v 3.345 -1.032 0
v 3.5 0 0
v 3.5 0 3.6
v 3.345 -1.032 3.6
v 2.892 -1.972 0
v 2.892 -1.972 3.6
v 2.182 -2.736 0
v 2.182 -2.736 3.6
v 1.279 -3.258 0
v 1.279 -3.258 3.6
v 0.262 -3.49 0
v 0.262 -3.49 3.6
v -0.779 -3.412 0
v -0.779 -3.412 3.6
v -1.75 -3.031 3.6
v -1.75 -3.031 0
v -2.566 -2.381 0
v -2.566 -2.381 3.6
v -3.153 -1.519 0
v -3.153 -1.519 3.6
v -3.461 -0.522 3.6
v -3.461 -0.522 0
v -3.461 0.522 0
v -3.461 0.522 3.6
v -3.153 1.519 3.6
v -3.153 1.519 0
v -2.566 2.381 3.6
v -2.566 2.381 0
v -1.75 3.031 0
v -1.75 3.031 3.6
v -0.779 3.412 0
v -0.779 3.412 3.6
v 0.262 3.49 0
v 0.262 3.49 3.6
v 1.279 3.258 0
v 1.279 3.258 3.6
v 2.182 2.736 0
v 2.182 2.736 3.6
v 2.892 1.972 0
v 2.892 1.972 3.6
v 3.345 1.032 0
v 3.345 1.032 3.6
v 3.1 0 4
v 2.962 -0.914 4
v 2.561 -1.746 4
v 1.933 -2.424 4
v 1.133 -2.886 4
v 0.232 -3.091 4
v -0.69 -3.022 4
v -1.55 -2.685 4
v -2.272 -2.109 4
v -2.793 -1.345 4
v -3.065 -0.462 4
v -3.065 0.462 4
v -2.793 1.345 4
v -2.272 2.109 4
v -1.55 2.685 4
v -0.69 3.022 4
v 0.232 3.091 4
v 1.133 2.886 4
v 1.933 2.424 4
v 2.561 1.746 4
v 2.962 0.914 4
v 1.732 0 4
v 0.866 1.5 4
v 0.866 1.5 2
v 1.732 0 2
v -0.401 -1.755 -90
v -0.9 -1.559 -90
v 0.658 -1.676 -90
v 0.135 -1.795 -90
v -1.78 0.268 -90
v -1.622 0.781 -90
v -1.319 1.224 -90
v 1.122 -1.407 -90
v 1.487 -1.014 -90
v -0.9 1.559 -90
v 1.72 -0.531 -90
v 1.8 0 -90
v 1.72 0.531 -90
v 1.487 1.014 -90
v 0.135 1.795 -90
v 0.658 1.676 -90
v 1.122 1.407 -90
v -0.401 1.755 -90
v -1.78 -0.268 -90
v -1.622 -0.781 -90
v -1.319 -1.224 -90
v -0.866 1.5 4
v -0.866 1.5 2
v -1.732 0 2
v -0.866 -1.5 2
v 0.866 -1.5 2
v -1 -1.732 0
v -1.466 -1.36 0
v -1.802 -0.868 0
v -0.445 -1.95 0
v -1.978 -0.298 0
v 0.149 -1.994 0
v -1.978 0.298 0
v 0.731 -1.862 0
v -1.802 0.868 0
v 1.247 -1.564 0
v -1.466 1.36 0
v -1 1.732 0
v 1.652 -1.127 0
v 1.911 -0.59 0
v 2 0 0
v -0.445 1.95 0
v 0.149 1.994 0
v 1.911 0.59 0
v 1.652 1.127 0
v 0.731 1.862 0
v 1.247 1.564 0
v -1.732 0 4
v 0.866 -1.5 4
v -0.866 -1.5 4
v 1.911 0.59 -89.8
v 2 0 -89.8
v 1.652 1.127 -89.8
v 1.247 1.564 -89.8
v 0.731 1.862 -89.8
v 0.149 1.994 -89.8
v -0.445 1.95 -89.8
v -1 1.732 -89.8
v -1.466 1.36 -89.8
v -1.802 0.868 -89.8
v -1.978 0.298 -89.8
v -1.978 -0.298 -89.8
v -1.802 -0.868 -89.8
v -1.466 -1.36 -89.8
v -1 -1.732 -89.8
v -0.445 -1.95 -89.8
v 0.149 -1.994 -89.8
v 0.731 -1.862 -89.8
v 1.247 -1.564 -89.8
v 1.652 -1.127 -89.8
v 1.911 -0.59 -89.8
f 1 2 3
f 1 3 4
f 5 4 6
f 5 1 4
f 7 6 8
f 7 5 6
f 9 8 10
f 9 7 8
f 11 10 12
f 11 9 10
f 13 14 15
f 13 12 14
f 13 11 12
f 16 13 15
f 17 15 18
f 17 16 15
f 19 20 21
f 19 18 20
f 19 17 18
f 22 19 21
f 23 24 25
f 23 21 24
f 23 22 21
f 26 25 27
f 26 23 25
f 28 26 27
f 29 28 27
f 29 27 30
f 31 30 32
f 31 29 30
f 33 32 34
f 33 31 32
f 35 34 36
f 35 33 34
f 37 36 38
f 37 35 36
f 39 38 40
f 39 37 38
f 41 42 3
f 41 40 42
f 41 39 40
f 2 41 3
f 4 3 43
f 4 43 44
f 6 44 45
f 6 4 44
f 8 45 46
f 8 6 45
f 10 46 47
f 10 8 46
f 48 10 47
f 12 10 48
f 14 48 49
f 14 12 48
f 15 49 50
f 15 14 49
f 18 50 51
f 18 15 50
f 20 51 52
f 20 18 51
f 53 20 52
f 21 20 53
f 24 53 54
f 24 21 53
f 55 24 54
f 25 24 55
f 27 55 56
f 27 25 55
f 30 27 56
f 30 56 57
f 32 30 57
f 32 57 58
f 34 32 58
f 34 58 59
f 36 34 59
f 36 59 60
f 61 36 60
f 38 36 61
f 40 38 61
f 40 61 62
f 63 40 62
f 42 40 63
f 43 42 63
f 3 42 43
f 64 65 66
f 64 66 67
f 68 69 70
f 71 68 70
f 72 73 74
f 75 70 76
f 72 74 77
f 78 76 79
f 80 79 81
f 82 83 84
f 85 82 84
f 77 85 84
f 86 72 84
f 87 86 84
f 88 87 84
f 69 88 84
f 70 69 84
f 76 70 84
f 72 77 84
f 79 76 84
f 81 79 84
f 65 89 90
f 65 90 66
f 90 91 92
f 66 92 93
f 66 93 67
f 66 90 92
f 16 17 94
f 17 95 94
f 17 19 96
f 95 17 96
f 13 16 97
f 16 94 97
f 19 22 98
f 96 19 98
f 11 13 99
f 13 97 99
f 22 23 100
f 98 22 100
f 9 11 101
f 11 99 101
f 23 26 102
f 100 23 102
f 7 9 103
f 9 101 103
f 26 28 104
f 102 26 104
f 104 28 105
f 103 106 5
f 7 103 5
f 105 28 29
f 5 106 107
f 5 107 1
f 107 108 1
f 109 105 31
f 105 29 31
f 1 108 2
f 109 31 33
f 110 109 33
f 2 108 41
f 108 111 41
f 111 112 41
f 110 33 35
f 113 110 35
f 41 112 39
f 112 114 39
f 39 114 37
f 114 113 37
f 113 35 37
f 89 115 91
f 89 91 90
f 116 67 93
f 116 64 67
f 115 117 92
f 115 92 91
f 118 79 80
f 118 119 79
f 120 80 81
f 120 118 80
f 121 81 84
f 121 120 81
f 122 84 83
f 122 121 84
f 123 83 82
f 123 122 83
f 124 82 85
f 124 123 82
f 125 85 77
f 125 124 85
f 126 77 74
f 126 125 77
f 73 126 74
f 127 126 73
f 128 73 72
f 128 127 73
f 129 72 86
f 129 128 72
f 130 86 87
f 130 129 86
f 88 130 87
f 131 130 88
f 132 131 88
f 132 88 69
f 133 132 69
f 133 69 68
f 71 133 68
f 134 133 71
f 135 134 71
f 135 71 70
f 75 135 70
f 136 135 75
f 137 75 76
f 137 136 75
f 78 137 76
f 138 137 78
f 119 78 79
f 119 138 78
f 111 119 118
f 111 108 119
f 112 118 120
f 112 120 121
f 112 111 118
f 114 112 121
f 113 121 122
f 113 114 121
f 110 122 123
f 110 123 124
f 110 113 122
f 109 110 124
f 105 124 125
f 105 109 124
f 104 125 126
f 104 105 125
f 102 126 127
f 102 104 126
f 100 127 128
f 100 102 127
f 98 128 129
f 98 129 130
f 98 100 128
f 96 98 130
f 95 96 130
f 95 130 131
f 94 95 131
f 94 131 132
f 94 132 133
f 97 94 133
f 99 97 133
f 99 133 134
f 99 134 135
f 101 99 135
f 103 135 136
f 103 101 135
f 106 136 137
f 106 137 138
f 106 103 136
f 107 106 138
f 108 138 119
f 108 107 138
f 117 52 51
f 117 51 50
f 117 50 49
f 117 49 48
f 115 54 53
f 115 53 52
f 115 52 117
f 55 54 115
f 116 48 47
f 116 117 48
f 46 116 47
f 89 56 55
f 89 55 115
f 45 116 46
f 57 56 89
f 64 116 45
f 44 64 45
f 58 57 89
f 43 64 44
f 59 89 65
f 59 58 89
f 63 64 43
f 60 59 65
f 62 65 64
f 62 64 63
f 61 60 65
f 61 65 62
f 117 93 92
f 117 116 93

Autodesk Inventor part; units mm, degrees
ref_plane "YZ Plane" through (0, 0, 0) normal (1, 0, 0) x (0, 1, 0)
ref_plane "XZ Plane" through (0, 0, 0) normal (0, 1, 0) x (-1, 0, 0)
ref_plane "XY Plane" through (0, 0, 0) normal (0, 0, 1) x (1, 0, 0)
sketch "Sketch3" plane through (0, 0, 0) normal (0, 0, 1) x (1, 0, 0)
  circle A0 centre (0, 0) radius 2
  dimension "Diameter" = 4
extrude "Extrusion1" add sketch "Sketch3" against normal blind 90
sketch "Sketch4" plane through (0, 0, 0) normal (0, 0, 1) x (1, 0, 0)
  circle A0 centre (0, 0) radius 2 projected
  circle A1 centre (0, 0) radius 3.5
  dimension "Head_Diameter" = 7
extrude "Extrusion2" add sketch "Sketch4" along normal blind 4 contours A0 | A1
sketch "Sketch5" plane through (0, 0, 4) normal (0, 0, 1) x (1, 0, 0)
  circle A0 centre (0, 0) radius 3.5 projected
  line L0 (1.7321, 0) -> (0.866, -1.5)
  line L1 (0.866, -1.5) -> (-0.866, -1.5)
  line L2 (-0.866, -1.5) -> (-1.7321, 0)
  line L3 (-1.7321, 0) -> (-0.866, 1.5)
  line L4 (-0.866, 1.5) -> (0.866, 1.5)
  line L5 (0.866, 1.5) -> (1.7321, 0)
  line L6 (0, 0) -> (1.7321, 0) construction
  dimension "Hex_Width" = 3
extrude "Extrusion3" cut sketch "Sketch5" against normal blind 2 contours L0 L1 L2 L3 L4 L5
thread "Thread1" size "M4x0.7" class "4g6g" standard "ANSI Metric M Profile" length 20
chamfer "Chamfer1" distance 0.4 angle 45 1 edges at (-3.5, 0, 4)
chamfer "Chamfer2" distance 0.2 angle 45 1 edges at (-2, 0, -90)
equation "\"d14\" = 0.5 * Chamfer"
equation "\"Chamfer\" = 0.4"
properties part number "SCREW, SOCKET HD, P, 12.9, M4X0.7X90MM" material "Steel, MS"
